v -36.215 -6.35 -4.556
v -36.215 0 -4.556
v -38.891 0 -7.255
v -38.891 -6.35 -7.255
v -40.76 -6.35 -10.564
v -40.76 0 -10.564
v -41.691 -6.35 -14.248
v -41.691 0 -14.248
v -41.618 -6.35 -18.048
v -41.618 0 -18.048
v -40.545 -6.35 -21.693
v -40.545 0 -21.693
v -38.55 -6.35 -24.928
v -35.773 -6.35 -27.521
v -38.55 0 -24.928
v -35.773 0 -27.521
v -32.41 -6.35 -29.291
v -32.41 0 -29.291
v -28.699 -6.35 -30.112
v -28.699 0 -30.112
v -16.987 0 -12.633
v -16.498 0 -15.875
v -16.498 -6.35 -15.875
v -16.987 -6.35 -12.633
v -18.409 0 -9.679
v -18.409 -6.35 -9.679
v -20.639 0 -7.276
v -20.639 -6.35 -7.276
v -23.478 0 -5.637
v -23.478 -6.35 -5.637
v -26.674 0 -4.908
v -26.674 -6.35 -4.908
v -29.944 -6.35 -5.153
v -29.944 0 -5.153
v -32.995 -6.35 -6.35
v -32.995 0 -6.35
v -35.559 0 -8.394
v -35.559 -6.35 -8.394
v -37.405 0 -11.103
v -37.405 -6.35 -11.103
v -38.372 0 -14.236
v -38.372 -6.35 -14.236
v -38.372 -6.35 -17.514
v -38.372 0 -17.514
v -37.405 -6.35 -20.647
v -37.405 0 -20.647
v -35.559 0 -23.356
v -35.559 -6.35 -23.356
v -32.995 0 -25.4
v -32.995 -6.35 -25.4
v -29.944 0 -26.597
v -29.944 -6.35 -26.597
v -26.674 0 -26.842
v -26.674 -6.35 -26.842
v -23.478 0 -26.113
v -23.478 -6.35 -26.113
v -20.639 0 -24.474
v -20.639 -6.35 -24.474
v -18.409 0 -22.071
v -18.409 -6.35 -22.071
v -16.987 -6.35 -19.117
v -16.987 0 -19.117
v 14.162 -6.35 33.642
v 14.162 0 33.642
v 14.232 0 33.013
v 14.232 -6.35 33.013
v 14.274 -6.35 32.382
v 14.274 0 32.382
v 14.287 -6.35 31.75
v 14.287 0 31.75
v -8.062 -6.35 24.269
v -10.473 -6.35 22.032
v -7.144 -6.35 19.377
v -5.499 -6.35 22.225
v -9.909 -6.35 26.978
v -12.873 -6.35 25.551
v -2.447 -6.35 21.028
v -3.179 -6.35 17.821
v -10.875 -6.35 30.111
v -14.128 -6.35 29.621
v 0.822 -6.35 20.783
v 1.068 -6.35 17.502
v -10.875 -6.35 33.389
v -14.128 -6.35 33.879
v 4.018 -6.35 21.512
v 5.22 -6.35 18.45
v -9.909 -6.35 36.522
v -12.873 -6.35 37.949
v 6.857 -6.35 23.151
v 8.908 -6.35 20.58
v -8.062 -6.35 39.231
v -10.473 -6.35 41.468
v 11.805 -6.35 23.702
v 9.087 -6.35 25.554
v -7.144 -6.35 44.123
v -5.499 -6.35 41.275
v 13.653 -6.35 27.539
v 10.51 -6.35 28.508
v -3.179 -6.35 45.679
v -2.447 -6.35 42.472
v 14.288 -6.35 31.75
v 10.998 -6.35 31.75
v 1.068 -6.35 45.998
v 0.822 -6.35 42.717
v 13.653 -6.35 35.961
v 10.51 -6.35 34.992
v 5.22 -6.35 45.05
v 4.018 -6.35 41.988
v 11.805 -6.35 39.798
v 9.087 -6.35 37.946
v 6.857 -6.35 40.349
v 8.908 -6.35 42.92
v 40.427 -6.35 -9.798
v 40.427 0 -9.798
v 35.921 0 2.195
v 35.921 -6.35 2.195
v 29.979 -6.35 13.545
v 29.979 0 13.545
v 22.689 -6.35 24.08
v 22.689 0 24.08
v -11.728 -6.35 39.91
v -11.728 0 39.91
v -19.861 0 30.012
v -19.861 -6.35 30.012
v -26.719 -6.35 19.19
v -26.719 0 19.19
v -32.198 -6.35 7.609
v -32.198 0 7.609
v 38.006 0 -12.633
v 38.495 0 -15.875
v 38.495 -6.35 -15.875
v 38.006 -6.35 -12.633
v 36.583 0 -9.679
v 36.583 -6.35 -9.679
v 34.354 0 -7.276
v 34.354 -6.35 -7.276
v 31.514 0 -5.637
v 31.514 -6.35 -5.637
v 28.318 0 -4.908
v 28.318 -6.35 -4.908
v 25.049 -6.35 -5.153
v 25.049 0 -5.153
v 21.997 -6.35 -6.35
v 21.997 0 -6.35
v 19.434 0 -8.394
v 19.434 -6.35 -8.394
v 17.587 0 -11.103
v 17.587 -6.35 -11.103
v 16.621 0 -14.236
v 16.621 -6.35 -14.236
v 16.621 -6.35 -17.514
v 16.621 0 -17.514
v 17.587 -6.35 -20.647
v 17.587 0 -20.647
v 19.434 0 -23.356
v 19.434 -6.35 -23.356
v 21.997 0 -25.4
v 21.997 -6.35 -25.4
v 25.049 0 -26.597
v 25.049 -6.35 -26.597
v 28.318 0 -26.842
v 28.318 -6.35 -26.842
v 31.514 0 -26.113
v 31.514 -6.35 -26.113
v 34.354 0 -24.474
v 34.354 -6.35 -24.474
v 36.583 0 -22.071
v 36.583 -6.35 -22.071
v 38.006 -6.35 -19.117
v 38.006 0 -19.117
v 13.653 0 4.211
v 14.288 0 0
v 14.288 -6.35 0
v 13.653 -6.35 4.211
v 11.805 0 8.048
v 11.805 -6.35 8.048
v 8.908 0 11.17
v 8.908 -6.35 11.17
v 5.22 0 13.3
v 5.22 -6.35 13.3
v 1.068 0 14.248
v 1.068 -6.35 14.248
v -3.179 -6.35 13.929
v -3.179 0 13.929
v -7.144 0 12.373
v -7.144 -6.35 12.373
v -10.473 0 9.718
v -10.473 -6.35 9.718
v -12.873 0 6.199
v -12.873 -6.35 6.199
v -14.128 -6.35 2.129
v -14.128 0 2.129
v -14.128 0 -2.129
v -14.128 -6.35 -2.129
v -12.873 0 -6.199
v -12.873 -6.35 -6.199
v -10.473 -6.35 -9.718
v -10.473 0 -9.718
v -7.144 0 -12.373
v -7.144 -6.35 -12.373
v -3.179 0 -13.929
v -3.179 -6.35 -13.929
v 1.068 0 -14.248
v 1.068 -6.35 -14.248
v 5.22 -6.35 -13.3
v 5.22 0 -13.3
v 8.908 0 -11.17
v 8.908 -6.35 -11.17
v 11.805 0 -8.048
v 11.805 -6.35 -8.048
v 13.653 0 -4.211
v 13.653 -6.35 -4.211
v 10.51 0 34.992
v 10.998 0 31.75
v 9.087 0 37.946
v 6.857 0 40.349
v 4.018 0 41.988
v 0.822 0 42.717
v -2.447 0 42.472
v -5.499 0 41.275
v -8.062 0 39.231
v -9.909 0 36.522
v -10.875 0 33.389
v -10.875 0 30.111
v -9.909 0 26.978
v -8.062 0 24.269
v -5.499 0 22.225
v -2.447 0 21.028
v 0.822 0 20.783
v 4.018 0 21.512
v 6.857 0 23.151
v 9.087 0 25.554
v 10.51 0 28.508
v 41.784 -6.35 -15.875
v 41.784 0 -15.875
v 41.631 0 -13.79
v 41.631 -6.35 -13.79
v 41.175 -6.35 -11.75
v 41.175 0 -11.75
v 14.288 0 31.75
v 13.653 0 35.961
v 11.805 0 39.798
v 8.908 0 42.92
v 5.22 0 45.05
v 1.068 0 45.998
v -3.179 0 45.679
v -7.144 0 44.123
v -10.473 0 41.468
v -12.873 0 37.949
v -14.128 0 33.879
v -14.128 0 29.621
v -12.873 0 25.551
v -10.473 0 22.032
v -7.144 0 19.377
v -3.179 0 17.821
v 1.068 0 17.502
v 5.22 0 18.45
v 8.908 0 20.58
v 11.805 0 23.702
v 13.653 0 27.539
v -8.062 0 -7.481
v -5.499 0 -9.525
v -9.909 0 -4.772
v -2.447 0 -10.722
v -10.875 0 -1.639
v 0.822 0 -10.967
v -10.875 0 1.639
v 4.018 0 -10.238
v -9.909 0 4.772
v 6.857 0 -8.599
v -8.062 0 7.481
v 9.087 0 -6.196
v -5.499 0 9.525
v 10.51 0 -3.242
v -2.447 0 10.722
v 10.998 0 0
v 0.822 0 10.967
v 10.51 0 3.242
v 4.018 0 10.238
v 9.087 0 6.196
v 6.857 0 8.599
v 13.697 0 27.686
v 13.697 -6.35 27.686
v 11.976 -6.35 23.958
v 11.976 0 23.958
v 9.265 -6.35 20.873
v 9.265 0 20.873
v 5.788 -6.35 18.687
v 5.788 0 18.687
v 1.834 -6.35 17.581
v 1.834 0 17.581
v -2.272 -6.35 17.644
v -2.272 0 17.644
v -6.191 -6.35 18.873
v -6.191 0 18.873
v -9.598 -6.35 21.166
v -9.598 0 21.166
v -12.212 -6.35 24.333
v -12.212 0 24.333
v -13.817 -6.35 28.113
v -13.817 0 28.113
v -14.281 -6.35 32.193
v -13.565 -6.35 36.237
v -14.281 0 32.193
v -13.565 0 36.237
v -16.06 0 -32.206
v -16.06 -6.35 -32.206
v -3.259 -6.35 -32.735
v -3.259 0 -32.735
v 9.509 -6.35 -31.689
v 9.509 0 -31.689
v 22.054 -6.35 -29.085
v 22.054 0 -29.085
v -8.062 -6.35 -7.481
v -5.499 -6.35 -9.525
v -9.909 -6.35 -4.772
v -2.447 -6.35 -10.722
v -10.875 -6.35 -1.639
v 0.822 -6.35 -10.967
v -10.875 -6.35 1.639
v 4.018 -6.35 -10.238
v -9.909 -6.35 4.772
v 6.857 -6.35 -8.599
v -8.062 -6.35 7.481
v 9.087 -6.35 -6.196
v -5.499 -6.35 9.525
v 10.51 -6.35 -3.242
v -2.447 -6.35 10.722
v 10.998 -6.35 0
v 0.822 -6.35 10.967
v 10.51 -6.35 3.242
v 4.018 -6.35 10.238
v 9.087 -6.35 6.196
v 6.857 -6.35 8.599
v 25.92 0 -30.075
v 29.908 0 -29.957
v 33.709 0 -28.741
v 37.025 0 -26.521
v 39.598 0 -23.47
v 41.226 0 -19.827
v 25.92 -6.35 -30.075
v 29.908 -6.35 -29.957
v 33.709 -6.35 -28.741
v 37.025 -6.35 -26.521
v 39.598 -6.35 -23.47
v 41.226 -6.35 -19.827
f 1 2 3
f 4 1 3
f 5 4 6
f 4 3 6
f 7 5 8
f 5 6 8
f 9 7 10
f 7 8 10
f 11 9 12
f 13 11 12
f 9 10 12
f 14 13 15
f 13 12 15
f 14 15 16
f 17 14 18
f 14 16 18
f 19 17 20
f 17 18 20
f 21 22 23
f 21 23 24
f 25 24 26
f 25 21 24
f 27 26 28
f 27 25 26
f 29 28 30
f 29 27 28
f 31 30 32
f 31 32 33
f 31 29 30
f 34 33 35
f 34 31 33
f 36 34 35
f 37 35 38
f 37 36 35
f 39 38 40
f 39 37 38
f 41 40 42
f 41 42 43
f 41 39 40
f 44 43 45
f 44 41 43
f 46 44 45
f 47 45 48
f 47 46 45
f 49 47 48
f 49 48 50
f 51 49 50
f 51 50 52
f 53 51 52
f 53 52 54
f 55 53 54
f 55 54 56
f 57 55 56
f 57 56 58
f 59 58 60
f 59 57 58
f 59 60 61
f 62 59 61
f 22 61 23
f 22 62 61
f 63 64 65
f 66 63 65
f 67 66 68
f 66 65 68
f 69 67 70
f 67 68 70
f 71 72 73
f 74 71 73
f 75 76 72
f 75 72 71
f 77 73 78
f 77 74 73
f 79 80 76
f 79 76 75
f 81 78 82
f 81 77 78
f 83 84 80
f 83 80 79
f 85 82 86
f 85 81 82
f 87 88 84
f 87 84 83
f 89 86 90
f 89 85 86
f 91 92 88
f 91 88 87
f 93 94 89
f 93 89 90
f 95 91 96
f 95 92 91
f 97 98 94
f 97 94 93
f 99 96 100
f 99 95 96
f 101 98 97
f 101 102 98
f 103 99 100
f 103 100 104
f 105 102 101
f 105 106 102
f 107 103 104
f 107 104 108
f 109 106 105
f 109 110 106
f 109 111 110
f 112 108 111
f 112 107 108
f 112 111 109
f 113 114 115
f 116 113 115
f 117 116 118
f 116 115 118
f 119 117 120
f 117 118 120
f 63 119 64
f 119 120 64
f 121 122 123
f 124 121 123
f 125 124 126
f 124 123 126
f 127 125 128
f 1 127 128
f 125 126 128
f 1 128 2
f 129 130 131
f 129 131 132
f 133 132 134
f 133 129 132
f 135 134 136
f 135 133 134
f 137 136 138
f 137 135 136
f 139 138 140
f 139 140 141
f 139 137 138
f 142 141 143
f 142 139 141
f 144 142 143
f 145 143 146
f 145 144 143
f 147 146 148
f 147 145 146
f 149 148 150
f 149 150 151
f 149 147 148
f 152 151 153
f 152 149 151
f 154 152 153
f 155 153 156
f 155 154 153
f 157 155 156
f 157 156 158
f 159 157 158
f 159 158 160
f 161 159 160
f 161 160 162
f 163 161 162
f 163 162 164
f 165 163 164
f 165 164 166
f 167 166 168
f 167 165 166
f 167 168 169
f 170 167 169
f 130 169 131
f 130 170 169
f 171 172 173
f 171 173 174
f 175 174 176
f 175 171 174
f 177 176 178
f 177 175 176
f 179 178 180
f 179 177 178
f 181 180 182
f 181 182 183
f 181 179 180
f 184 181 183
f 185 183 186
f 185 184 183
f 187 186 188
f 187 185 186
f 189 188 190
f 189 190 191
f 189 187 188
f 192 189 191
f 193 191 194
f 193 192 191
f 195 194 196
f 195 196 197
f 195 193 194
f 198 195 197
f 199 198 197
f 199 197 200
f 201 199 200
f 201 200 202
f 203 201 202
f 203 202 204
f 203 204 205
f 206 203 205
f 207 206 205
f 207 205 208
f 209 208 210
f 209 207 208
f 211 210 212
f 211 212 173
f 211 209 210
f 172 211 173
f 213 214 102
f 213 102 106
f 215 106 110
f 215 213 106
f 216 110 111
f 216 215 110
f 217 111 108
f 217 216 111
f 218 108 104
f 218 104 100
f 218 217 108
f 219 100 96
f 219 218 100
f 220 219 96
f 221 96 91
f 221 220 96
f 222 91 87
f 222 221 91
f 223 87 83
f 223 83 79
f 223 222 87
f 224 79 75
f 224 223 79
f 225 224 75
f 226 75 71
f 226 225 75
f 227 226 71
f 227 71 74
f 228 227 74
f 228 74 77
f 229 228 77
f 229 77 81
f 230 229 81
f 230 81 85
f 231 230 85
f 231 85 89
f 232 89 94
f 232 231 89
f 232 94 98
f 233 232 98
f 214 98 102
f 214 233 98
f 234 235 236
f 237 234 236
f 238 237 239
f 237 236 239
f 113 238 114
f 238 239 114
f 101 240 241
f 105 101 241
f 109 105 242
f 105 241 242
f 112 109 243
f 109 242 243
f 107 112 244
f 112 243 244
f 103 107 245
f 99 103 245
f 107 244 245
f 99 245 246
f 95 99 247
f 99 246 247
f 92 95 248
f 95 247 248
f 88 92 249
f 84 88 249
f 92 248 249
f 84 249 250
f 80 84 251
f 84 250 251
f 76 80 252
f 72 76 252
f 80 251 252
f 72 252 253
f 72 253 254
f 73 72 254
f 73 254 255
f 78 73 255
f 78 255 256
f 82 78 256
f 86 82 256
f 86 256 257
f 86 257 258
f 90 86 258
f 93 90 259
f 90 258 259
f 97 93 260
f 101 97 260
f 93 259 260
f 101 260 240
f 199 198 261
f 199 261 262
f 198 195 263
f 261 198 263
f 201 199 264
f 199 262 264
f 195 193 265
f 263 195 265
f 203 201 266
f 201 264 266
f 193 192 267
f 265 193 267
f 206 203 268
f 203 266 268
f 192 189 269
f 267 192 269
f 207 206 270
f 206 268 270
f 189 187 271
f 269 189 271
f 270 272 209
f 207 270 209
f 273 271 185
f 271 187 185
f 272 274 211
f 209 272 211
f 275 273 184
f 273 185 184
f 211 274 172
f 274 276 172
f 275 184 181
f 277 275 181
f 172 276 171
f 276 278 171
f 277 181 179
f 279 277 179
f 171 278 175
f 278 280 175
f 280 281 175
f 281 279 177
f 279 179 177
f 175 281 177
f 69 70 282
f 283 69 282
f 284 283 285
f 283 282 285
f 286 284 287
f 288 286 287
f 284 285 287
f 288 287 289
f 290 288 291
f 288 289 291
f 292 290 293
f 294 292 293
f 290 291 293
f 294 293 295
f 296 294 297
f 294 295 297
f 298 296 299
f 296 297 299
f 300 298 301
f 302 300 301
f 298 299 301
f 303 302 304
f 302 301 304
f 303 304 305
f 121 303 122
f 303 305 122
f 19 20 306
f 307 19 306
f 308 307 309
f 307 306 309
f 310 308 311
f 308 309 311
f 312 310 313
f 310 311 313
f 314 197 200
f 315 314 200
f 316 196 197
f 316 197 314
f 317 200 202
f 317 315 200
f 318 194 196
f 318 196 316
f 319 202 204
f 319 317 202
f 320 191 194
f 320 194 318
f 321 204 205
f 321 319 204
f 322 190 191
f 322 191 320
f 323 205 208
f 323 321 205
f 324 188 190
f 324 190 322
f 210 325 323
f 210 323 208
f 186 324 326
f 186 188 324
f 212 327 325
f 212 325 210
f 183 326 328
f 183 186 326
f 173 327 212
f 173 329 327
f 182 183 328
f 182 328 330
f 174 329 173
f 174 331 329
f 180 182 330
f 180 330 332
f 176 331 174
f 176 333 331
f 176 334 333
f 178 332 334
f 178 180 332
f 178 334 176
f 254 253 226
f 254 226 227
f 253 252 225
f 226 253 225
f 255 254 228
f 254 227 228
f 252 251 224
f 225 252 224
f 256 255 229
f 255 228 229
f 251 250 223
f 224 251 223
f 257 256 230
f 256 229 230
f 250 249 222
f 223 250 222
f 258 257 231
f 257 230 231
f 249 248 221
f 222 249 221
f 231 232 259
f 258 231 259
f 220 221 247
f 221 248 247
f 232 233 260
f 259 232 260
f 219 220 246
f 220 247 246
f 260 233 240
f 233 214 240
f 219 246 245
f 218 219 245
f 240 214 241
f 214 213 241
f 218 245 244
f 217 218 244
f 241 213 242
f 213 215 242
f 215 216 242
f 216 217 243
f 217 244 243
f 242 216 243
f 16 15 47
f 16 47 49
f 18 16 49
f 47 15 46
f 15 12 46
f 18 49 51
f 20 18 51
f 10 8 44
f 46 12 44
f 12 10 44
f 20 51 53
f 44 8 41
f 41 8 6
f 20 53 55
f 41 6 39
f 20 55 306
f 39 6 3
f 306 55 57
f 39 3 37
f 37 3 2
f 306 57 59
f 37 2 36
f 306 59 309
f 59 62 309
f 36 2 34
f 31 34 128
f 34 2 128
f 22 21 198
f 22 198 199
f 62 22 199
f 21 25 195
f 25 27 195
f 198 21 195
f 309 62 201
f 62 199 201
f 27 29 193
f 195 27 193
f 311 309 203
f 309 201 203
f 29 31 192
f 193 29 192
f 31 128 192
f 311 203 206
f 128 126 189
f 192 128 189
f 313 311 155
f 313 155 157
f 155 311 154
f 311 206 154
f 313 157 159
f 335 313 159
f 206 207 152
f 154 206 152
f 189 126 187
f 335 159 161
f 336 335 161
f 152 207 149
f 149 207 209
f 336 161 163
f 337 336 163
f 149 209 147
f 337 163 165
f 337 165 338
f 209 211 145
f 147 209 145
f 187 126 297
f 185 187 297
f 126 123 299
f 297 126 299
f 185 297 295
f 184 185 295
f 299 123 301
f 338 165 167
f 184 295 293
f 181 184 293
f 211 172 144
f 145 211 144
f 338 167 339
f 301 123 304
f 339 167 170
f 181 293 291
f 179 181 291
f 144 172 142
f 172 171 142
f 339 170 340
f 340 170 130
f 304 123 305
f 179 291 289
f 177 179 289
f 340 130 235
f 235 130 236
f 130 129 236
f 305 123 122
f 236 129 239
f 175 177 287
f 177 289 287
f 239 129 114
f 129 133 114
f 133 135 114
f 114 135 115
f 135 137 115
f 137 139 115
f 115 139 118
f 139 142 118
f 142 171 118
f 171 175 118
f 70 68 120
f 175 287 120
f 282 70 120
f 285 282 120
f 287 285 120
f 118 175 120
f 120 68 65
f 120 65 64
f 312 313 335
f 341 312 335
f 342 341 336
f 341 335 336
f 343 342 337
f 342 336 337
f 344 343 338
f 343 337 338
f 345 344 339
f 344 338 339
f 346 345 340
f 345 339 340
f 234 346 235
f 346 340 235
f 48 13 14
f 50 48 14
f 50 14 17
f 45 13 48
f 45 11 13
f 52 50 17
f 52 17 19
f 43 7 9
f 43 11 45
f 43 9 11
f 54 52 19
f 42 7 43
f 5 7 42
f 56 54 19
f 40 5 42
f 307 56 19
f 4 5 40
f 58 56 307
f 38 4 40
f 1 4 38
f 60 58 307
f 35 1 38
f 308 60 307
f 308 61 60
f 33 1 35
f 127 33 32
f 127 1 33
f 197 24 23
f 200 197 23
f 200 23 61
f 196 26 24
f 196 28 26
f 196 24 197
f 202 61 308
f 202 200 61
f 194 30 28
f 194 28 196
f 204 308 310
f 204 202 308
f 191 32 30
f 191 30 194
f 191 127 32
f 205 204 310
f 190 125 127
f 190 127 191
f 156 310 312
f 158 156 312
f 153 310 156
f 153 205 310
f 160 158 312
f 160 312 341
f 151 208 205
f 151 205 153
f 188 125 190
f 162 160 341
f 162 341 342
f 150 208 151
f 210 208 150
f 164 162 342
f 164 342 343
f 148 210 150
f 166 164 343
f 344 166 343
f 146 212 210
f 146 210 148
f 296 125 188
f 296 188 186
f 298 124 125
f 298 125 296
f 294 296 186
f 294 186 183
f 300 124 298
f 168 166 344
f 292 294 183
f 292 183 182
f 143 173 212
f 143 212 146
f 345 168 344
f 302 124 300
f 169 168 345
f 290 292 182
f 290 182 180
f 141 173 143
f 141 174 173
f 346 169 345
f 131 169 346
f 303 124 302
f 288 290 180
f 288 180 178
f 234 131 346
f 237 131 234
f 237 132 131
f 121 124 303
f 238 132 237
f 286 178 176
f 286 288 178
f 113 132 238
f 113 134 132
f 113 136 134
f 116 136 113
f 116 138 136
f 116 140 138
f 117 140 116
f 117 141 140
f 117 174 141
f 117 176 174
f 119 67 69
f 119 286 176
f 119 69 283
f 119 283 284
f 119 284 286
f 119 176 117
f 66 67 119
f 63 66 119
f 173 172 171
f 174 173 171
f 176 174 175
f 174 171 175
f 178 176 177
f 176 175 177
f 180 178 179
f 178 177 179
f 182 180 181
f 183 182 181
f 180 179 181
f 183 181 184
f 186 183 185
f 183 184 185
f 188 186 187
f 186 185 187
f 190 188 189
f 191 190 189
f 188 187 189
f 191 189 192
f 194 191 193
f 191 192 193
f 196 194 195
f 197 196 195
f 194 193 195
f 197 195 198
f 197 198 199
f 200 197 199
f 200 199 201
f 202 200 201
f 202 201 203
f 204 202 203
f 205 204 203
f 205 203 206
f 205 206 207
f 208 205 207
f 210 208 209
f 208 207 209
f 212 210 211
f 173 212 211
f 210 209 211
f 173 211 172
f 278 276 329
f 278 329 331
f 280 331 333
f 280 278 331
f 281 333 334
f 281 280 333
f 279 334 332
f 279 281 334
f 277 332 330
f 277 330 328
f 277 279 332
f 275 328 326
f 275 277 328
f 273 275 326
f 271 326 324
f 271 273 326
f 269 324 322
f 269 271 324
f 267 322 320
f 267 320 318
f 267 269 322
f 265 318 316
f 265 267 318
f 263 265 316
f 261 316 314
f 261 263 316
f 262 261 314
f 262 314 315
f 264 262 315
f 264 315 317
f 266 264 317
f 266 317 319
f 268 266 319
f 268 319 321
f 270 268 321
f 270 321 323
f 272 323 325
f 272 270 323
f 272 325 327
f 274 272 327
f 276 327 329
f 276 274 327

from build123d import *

# Parameters (mm, degrees)
F0_R     = 14.2875
F0_R_2   = 10.9982
F2_DEPTH = 6.35
F1_R     = 10.9982
F1_R_2   = 14.2875


with BuildPart() as f2:
    # F0 (on Front) → F2 (new body)
    with BuildSketch(Plane.XZ):
        with Locations((0, 31.75)):
            Circle(F0_R)
        with Locations((0, 31.75)):
            Circle(F0_R_2, mode=Mode.SUBTRACT)
    extrude(amount=F2_DEPTH)


with BuildPart() as f2b:
    # F0 (on Front) → F2, piece 2 (new body)
    with BuildSketch(Plane.XZ):
        Circle(F0_R)
        Circle(F0_R_2, mode=Mode.SUBTRACT)
    extrude(amount=F2_DEPTH)


with BuildPart() as f2c:
    # F1 (on face) → F2, piece 3 (new body)
    with BuildSketch(Plane.XZ):
        with BuildLine():
            ThreePointArc((41.7838065702, -15.875), (41.4405176602, -12.7618611777), (40.4271474867, -9.7983224999))
            ThreePointArc((40.4271474867, -9.7983224999), (17.1515631107, -6.0201058347), (22.0535595667, -29.0851915696))
            ThreePointArc((22.0535595667, -29.0851915696), (35.4451872599, -27.7471502699), (41.7838065702, -15.875))
        make_face()
        with Locations((27.4963065702, -15.875)):
            Circle(F1_R, mode=Mode.SUBTRACT)
        with BuildLine():
            ThreePointArc((-13.2088065702, -15.875), (-21.1891631837, -3.0549922561), (-36.2152945566, -4.5563470438))
            ThreePointArc((-36.2152945566, -4.5563470438), (-41.2032669986, -19.9063635489), (-28.6991699428, -30.1117754761))
            ThreePointArc((-28.6991699428, -30.1117754761), (-17.8281437195, -26.3944716285), (-13.2088065702, -15.875))
        make_face()
        with Locations((-27.4963065702, -15.875)):
            Circle(F1_R, mode=Mode.SUBTRACT)
        with BuildLine():
            ThreePointArc((14.1617349899, 33.6415386135), (14.2560240761, 32.697857474), (14.2875, 31.75))
            ThreePointArc((14.2875, 31.75), (-4.2760482393, 18.1173895491), (-11.727977544, 39.910097976))
            ThreePointArc((-11.727977544, 39.910097976), (-26.7194199084, 19.1900581454), (-36.2152945566, -4.5563470438))
            ThreePointArc((-36.2152945566, -4.5563470438), (-21.1891631837, -3.0549922561), (-13.2088065702, -15.875))
            ThreePointArc((-13.2088065702, -15.875), (-17.8281437195, -26.3944716285), (-28.6991699428, -30.1117754761))
            ThreePointArc((-28.6991699428, -30.1117754761), (-3.2593678998, -32.7347254878), (22.0535595667, -29.0851915696))
            ThreePointArc((22.0535595667, -29.0851915696), (17.1515631107, -6.0201058347), (40.4271474867, -9.7983224999))
            ThreePointArc((40.4271474867, -9.7983224999), (29.9787878083, 13.5446673424), (14.1617349899, 33.6415386135))
        make_face()
        Circle(F1_R_2, mode=Mode.SUBTRACT)
    extrude(amount=F2_DEPTH)


solid = Compound([f2.part, f2b.part, f2c.part])
